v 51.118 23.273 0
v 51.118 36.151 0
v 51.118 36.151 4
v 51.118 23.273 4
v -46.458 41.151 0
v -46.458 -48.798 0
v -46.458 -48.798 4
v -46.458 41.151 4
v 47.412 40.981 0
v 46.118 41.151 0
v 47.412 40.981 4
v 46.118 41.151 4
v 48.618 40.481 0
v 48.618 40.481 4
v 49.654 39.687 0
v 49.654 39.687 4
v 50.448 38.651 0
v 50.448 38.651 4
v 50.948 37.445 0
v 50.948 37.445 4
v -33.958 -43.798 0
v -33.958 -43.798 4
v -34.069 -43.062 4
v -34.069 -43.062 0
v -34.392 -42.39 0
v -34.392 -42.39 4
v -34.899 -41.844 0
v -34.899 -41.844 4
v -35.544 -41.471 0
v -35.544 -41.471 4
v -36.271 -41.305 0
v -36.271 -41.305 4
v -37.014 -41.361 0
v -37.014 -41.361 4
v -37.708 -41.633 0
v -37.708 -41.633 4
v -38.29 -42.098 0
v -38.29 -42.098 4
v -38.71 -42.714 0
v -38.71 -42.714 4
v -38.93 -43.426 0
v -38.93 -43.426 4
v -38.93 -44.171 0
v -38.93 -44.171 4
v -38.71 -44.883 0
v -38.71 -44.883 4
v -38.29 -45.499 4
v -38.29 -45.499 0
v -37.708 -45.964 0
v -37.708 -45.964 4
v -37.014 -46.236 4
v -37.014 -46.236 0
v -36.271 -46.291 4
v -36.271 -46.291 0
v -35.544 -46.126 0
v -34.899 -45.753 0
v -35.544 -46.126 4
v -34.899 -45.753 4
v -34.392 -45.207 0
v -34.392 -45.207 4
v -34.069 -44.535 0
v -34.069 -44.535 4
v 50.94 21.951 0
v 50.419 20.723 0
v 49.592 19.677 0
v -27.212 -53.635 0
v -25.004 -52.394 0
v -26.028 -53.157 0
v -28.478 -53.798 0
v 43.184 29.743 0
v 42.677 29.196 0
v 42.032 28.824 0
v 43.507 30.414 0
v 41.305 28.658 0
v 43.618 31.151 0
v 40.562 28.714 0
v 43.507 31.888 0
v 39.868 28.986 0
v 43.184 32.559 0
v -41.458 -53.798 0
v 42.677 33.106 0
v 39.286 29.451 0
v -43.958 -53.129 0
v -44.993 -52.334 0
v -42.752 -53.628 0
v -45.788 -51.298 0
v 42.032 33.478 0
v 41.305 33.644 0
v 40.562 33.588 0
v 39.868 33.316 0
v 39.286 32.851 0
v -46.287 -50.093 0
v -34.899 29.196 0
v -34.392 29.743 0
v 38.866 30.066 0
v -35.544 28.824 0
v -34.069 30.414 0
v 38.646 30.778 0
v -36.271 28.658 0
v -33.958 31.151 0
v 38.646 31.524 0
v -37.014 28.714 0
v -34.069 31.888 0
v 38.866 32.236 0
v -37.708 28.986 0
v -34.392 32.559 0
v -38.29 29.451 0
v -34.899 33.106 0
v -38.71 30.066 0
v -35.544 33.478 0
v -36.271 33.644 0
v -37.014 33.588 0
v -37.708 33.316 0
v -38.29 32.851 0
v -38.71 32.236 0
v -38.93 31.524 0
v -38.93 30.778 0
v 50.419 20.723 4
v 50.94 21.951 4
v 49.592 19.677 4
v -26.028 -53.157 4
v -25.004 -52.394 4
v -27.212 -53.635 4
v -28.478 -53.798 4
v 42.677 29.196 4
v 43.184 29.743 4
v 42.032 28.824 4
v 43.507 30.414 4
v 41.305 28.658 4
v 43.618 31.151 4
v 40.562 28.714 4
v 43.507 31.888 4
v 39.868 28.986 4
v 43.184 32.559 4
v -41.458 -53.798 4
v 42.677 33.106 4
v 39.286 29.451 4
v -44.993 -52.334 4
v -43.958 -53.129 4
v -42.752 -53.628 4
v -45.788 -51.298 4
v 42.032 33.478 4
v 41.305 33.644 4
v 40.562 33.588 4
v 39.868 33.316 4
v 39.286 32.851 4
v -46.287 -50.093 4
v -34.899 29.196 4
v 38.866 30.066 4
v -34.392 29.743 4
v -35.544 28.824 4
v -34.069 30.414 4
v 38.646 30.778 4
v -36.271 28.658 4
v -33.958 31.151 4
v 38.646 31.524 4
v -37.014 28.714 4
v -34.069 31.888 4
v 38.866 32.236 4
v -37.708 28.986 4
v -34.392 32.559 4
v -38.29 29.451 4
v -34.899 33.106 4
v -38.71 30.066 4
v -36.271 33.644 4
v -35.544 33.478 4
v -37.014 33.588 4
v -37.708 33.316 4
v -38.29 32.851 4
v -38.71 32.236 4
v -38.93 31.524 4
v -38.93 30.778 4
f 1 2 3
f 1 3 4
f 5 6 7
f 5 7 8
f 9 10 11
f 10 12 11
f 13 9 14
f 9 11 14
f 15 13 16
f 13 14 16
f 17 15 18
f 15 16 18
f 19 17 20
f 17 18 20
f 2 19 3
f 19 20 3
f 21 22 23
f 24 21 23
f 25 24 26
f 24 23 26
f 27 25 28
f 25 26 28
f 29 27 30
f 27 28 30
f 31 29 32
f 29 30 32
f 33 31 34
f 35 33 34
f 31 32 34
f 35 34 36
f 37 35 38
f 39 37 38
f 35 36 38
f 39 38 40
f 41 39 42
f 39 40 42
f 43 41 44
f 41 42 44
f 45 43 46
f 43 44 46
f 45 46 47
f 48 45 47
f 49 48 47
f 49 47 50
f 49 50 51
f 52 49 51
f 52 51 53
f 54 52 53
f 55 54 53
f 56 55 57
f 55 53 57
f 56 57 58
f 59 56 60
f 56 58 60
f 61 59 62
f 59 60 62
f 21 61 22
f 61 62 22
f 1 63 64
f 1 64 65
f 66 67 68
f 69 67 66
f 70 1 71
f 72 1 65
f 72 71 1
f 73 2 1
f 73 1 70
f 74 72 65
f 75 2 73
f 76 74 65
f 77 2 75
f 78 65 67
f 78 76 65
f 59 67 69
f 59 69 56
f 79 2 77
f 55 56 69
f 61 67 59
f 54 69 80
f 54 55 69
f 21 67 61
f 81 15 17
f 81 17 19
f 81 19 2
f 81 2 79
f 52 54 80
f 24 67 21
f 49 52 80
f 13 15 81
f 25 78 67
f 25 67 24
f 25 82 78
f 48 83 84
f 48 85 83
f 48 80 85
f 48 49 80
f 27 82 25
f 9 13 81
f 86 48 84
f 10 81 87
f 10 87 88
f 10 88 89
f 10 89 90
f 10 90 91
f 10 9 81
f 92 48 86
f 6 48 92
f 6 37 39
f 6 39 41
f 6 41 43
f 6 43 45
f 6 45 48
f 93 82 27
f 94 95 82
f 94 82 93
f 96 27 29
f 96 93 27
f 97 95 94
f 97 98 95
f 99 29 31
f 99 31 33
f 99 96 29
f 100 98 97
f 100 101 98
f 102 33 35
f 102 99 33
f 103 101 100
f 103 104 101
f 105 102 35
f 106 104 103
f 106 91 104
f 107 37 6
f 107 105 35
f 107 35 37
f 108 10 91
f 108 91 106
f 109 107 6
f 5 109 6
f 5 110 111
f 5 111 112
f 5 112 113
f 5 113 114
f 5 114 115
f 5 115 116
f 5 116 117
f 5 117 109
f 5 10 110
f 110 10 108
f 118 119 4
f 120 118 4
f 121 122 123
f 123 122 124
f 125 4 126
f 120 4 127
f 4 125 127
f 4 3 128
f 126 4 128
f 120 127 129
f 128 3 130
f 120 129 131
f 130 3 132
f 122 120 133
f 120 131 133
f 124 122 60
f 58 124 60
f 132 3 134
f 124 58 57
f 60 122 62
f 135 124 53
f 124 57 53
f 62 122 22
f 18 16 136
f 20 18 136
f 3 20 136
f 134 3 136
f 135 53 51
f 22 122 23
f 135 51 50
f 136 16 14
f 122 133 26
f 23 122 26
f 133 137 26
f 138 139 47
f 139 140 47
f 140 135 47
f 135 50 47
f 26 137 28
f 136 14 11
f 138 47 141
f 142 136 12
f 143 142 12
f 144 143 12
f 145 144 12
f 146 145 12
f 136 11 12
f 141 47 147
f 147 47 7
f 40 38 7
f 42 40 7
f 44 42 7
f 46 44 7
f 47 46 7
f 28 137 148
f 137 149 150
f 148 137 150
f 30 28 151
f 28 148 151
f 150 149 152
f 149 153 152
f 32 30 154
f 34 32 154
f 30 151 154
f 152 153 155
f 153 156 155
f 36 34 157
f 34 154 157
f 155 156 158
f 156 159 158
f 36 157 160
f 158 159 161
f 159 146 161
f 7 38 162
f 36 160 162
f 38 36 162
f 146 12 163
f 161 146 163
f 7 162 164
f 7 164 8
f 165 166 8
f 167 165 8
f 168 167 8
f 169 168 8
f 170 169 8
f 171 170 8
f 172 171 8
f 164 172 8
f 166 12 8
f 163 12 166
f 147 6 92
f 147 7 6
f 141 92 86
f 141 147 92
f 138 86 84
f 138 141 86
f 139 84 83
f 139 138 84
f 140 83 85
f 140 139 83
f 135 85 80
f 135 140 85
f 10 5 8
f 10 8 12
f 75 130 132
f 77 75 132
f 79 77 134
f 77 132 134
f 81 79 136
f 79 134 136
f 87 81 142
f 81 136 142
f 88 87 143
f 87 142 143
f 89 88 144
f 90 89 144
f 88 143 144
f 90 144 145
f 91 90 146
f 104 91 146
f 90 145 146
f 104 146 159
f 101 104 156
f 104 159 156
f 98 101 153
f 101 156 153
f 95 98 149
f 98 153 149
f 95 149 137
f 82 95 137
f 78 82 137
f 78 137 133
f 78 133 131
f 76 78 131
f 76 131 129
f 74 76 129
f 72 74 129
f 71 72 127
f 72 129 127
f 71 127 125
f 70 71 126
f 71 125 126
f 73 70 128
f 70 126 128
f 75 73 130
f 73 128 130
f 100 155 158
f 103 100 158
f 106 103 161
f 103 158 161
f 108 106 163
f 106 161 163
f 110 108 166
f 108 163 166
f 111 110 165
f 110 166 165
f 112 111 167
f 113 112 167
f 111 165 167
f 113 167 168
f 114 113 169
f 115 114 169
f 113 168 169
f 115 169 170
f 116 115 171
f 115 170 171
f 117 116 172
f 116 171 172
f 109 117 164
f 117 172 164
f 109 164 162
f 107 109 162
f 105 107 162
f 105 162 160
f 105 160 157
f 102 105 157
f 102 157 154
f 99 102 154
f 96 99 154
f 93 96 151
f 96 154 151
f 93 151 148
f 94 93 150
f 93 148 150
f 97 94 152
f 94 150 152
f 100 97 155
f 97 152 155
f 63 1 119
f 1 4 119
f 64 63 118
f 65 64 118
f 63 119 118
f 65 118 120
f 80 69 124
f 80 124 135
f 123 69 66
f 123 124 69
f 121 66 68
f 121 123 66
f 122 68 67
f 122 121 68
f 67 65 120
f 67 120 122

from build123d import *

# Parameters (mm, degrees)
BOSS_EXTRU_1_DEPTH      = 4
ESQUISSE2_R             = 2.5
ENL_V_MAT_EXTRU_1_DEPTH = 4
CONG_1_R                = 5


with BuildPart() as part:
    # Esquisse1 → Boss.-Extru.1 (new body)
    with BuildSketch(Plane.XY):
        Polygon((-46.45758945, 41.15105452), (51.118168125, 41.15105452), (51.118168125, 21.15105452), (-26.45758945, -53.798440429), (-46.45758945, -53.798440429), align=None)
    extrude(amount=BOSS_EXTRU_1_DEPTH)

    # Esquisse2 → Enlèv. mat.-Extru.1 (cut)
    with BuildSketch(Plane.XY.offset(4)):
        with Locations((-36.45758945, 31.15105452)):
            Circle(ESQUISSE2_R)
        with Locations((41.118168125, 31.15105452)):
            Circle(ESQUISSE2_R)
        with Locations((-36.45758945, -43.798440429)):
            Circle(ESQUISSE2_R)
    extrude(amount=-ENL_V_MAT_EXTRU_1_DEPTH, mode=Mode.SUBTRACT)

    # Congé1
    cong_1_edges = [part.edges().sort_by_distance(p)[0] for p in [
        (51.118168125, 41.15105452, 2),
        (51.118168125, 21.15105452, 2),
        (-26.45758945, -53.798440429, 2),
        (-46.45758945, -53.798440429, 2),
    ]]
    fillet(cong_1_edges, radius=CONG_1_R)


solid = part.part
